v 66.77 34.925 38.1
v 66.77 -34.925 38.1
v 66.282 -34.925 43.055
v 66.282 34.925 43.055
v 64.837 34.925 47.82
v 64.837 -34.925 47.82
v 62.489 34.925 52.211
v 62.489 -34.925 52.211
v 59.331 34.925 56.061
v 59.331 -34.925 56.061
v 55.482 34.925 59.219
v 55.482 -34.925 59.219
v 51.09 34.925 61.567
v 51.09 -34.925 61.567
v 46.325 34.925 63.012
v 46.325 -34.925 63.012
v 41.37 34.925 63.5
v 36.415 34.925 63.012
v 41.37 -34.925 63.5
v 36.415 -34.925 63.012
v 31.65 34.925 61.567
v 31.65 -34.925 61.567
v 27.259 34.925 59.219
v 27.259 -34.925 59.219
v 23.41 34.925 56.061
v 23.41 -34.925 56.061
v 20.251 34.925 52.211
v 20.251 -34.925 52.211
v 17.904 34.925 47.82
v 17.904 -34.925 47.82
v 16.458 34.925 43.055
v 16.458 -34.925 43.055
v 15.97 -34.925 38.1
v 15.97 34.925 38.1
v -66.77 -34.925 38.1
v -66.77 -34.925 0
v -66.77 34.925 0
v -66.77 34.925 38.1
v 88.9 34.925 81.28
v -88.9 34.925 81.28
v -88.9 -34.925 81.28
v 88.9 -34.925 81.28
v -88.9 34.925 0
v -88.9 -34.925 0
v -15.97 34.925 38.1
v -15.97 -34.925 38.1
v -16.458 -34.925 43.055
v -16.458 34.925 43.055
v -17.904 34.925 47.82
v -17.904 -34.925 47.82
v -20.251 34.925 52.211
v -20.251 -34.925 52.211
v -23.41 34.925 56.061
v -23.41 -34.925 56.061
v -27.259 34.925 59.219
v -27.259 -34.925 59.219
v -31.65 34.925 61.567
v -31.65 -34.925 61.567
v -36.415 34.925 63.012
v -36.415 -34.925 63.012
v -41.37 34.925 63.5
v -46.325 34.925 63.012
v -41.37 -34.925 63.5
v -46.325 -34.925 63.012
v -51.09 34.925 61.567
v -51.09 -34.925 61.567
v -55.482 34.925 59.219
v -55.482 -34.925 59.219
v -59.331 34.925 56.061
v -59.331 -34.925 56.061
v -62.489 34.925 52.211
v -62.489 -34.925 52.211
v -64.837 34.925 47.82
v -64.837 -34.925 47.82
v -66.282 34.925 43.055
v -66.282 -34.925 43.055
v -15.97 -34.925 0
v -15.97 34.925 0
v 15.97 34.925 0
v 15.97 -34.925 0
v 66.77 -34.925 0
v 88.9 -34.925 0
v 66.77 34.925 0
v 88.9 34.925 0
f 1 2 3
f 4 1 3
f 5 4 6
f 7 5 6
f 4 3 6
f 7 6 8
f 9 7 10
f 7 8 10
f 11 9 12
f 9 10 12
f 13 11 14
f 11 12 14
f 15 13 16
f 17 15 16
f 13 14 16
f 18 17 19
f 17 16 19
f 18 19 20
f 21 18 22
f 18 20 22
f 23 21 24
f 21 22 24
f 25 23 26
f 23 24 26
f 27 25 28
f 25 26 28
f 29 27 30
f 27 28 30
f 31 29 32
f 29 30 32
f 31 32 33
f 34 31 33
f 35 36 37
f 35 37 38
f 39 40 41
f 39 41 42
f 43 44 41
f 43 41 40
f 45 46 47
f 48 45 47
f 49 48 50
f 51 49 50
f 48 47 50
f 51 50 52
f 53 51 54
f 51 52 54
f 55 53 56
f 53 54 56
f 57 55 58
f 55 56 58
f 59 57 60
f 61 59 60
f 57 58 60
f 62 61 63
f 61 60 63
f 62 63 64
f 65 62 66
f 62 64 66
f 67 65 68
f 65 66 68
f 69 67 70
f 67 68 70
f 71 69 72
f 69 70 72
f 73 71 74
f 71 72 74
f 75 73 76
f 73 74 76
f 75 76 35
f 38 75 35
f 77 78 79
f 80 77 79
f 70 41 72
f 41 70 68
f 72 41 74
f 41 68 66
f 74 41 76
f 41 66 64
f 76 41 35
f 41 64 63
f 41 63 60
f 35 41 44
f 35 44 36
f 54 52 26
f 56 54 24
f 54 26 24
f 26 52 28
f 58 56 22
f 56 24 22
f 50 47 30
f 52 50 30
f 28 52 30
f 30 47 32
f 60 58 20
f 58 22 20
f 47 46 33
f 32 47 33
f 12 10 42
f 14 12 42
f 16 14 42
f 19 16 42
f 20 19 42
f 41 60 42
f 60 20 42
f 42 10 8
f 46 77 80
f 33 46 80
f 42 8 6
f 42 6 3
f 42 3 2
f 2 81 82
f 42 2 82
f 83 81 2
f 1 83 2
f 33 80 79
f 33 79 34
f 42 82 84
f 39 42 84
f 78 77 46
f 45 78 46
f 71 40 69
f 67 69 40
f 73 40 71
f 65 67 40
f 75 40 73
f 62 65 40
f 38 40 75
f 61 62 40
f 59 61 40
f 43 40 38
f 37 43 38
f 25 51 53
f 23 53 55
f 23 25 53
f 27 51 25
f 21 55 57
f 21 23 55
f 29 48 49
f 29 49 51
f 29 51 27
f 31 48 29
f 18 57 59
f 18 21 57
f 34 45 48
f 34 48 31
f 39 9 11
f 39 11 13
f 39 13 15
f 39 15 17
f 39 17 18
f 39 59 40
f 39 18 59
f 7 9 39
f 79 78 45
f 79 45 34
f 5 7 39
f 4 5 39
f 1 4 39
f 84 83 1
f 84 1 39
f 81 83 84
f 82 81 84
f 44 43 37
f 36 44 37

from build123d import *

# Parameters (mm, degrees)
F0_W     = 177.8
F0_H     = 69.85
F1_DEPTH = 81.28
F3_W     = 50.8
F3_H     = 38.1
F4_DEPTH = 69.85
F5_DEPTH = 69.85


with BuildPart() as f1:
    # F0 (on Top) → F1 (new body)
    with BuildSketch(Plane.XY):
        Rectangle(F0_W, F0_H)
    extrude(amount=F1_DEPTH)

    # F3 (on offset) → F4 (cut)
    with BuildSketch(Plane.XZ.offset(34.925)):
        with BuildLine():
            ThreePointArc((-15.970058, 38.1), (-41.370058, 63.5), (-66.770058, 38.1))
            Line((-66.770058, 38.1), (-15.970058, 38.1))
        make_face()
        with Locations((-41.370058, 19.05)):
            Rectangle(F3_W, F3_H)
    extrude(amount=-F4_DEPTH, mode=Mode.SUBTRACT)

    # F3 (on offset) → F5 (cut)
    with BuildSketch(Plane.XZ.offset(34.925)):
        with Locations((41.370058, 19.05)):
            Rectangle(F3_W, F3_H)
        with BuildLine():
            Line((15.970058, 38.1), (66.770058, 38.1))
            ThreePointArc((66.770058, 38.1), (41.370058, 63.5), (15.970058, 38.1))
        make_face()
    extrude(amount=-F5_DEPTH, mode=Mode.SUBTRACT)


solid = f1.part
